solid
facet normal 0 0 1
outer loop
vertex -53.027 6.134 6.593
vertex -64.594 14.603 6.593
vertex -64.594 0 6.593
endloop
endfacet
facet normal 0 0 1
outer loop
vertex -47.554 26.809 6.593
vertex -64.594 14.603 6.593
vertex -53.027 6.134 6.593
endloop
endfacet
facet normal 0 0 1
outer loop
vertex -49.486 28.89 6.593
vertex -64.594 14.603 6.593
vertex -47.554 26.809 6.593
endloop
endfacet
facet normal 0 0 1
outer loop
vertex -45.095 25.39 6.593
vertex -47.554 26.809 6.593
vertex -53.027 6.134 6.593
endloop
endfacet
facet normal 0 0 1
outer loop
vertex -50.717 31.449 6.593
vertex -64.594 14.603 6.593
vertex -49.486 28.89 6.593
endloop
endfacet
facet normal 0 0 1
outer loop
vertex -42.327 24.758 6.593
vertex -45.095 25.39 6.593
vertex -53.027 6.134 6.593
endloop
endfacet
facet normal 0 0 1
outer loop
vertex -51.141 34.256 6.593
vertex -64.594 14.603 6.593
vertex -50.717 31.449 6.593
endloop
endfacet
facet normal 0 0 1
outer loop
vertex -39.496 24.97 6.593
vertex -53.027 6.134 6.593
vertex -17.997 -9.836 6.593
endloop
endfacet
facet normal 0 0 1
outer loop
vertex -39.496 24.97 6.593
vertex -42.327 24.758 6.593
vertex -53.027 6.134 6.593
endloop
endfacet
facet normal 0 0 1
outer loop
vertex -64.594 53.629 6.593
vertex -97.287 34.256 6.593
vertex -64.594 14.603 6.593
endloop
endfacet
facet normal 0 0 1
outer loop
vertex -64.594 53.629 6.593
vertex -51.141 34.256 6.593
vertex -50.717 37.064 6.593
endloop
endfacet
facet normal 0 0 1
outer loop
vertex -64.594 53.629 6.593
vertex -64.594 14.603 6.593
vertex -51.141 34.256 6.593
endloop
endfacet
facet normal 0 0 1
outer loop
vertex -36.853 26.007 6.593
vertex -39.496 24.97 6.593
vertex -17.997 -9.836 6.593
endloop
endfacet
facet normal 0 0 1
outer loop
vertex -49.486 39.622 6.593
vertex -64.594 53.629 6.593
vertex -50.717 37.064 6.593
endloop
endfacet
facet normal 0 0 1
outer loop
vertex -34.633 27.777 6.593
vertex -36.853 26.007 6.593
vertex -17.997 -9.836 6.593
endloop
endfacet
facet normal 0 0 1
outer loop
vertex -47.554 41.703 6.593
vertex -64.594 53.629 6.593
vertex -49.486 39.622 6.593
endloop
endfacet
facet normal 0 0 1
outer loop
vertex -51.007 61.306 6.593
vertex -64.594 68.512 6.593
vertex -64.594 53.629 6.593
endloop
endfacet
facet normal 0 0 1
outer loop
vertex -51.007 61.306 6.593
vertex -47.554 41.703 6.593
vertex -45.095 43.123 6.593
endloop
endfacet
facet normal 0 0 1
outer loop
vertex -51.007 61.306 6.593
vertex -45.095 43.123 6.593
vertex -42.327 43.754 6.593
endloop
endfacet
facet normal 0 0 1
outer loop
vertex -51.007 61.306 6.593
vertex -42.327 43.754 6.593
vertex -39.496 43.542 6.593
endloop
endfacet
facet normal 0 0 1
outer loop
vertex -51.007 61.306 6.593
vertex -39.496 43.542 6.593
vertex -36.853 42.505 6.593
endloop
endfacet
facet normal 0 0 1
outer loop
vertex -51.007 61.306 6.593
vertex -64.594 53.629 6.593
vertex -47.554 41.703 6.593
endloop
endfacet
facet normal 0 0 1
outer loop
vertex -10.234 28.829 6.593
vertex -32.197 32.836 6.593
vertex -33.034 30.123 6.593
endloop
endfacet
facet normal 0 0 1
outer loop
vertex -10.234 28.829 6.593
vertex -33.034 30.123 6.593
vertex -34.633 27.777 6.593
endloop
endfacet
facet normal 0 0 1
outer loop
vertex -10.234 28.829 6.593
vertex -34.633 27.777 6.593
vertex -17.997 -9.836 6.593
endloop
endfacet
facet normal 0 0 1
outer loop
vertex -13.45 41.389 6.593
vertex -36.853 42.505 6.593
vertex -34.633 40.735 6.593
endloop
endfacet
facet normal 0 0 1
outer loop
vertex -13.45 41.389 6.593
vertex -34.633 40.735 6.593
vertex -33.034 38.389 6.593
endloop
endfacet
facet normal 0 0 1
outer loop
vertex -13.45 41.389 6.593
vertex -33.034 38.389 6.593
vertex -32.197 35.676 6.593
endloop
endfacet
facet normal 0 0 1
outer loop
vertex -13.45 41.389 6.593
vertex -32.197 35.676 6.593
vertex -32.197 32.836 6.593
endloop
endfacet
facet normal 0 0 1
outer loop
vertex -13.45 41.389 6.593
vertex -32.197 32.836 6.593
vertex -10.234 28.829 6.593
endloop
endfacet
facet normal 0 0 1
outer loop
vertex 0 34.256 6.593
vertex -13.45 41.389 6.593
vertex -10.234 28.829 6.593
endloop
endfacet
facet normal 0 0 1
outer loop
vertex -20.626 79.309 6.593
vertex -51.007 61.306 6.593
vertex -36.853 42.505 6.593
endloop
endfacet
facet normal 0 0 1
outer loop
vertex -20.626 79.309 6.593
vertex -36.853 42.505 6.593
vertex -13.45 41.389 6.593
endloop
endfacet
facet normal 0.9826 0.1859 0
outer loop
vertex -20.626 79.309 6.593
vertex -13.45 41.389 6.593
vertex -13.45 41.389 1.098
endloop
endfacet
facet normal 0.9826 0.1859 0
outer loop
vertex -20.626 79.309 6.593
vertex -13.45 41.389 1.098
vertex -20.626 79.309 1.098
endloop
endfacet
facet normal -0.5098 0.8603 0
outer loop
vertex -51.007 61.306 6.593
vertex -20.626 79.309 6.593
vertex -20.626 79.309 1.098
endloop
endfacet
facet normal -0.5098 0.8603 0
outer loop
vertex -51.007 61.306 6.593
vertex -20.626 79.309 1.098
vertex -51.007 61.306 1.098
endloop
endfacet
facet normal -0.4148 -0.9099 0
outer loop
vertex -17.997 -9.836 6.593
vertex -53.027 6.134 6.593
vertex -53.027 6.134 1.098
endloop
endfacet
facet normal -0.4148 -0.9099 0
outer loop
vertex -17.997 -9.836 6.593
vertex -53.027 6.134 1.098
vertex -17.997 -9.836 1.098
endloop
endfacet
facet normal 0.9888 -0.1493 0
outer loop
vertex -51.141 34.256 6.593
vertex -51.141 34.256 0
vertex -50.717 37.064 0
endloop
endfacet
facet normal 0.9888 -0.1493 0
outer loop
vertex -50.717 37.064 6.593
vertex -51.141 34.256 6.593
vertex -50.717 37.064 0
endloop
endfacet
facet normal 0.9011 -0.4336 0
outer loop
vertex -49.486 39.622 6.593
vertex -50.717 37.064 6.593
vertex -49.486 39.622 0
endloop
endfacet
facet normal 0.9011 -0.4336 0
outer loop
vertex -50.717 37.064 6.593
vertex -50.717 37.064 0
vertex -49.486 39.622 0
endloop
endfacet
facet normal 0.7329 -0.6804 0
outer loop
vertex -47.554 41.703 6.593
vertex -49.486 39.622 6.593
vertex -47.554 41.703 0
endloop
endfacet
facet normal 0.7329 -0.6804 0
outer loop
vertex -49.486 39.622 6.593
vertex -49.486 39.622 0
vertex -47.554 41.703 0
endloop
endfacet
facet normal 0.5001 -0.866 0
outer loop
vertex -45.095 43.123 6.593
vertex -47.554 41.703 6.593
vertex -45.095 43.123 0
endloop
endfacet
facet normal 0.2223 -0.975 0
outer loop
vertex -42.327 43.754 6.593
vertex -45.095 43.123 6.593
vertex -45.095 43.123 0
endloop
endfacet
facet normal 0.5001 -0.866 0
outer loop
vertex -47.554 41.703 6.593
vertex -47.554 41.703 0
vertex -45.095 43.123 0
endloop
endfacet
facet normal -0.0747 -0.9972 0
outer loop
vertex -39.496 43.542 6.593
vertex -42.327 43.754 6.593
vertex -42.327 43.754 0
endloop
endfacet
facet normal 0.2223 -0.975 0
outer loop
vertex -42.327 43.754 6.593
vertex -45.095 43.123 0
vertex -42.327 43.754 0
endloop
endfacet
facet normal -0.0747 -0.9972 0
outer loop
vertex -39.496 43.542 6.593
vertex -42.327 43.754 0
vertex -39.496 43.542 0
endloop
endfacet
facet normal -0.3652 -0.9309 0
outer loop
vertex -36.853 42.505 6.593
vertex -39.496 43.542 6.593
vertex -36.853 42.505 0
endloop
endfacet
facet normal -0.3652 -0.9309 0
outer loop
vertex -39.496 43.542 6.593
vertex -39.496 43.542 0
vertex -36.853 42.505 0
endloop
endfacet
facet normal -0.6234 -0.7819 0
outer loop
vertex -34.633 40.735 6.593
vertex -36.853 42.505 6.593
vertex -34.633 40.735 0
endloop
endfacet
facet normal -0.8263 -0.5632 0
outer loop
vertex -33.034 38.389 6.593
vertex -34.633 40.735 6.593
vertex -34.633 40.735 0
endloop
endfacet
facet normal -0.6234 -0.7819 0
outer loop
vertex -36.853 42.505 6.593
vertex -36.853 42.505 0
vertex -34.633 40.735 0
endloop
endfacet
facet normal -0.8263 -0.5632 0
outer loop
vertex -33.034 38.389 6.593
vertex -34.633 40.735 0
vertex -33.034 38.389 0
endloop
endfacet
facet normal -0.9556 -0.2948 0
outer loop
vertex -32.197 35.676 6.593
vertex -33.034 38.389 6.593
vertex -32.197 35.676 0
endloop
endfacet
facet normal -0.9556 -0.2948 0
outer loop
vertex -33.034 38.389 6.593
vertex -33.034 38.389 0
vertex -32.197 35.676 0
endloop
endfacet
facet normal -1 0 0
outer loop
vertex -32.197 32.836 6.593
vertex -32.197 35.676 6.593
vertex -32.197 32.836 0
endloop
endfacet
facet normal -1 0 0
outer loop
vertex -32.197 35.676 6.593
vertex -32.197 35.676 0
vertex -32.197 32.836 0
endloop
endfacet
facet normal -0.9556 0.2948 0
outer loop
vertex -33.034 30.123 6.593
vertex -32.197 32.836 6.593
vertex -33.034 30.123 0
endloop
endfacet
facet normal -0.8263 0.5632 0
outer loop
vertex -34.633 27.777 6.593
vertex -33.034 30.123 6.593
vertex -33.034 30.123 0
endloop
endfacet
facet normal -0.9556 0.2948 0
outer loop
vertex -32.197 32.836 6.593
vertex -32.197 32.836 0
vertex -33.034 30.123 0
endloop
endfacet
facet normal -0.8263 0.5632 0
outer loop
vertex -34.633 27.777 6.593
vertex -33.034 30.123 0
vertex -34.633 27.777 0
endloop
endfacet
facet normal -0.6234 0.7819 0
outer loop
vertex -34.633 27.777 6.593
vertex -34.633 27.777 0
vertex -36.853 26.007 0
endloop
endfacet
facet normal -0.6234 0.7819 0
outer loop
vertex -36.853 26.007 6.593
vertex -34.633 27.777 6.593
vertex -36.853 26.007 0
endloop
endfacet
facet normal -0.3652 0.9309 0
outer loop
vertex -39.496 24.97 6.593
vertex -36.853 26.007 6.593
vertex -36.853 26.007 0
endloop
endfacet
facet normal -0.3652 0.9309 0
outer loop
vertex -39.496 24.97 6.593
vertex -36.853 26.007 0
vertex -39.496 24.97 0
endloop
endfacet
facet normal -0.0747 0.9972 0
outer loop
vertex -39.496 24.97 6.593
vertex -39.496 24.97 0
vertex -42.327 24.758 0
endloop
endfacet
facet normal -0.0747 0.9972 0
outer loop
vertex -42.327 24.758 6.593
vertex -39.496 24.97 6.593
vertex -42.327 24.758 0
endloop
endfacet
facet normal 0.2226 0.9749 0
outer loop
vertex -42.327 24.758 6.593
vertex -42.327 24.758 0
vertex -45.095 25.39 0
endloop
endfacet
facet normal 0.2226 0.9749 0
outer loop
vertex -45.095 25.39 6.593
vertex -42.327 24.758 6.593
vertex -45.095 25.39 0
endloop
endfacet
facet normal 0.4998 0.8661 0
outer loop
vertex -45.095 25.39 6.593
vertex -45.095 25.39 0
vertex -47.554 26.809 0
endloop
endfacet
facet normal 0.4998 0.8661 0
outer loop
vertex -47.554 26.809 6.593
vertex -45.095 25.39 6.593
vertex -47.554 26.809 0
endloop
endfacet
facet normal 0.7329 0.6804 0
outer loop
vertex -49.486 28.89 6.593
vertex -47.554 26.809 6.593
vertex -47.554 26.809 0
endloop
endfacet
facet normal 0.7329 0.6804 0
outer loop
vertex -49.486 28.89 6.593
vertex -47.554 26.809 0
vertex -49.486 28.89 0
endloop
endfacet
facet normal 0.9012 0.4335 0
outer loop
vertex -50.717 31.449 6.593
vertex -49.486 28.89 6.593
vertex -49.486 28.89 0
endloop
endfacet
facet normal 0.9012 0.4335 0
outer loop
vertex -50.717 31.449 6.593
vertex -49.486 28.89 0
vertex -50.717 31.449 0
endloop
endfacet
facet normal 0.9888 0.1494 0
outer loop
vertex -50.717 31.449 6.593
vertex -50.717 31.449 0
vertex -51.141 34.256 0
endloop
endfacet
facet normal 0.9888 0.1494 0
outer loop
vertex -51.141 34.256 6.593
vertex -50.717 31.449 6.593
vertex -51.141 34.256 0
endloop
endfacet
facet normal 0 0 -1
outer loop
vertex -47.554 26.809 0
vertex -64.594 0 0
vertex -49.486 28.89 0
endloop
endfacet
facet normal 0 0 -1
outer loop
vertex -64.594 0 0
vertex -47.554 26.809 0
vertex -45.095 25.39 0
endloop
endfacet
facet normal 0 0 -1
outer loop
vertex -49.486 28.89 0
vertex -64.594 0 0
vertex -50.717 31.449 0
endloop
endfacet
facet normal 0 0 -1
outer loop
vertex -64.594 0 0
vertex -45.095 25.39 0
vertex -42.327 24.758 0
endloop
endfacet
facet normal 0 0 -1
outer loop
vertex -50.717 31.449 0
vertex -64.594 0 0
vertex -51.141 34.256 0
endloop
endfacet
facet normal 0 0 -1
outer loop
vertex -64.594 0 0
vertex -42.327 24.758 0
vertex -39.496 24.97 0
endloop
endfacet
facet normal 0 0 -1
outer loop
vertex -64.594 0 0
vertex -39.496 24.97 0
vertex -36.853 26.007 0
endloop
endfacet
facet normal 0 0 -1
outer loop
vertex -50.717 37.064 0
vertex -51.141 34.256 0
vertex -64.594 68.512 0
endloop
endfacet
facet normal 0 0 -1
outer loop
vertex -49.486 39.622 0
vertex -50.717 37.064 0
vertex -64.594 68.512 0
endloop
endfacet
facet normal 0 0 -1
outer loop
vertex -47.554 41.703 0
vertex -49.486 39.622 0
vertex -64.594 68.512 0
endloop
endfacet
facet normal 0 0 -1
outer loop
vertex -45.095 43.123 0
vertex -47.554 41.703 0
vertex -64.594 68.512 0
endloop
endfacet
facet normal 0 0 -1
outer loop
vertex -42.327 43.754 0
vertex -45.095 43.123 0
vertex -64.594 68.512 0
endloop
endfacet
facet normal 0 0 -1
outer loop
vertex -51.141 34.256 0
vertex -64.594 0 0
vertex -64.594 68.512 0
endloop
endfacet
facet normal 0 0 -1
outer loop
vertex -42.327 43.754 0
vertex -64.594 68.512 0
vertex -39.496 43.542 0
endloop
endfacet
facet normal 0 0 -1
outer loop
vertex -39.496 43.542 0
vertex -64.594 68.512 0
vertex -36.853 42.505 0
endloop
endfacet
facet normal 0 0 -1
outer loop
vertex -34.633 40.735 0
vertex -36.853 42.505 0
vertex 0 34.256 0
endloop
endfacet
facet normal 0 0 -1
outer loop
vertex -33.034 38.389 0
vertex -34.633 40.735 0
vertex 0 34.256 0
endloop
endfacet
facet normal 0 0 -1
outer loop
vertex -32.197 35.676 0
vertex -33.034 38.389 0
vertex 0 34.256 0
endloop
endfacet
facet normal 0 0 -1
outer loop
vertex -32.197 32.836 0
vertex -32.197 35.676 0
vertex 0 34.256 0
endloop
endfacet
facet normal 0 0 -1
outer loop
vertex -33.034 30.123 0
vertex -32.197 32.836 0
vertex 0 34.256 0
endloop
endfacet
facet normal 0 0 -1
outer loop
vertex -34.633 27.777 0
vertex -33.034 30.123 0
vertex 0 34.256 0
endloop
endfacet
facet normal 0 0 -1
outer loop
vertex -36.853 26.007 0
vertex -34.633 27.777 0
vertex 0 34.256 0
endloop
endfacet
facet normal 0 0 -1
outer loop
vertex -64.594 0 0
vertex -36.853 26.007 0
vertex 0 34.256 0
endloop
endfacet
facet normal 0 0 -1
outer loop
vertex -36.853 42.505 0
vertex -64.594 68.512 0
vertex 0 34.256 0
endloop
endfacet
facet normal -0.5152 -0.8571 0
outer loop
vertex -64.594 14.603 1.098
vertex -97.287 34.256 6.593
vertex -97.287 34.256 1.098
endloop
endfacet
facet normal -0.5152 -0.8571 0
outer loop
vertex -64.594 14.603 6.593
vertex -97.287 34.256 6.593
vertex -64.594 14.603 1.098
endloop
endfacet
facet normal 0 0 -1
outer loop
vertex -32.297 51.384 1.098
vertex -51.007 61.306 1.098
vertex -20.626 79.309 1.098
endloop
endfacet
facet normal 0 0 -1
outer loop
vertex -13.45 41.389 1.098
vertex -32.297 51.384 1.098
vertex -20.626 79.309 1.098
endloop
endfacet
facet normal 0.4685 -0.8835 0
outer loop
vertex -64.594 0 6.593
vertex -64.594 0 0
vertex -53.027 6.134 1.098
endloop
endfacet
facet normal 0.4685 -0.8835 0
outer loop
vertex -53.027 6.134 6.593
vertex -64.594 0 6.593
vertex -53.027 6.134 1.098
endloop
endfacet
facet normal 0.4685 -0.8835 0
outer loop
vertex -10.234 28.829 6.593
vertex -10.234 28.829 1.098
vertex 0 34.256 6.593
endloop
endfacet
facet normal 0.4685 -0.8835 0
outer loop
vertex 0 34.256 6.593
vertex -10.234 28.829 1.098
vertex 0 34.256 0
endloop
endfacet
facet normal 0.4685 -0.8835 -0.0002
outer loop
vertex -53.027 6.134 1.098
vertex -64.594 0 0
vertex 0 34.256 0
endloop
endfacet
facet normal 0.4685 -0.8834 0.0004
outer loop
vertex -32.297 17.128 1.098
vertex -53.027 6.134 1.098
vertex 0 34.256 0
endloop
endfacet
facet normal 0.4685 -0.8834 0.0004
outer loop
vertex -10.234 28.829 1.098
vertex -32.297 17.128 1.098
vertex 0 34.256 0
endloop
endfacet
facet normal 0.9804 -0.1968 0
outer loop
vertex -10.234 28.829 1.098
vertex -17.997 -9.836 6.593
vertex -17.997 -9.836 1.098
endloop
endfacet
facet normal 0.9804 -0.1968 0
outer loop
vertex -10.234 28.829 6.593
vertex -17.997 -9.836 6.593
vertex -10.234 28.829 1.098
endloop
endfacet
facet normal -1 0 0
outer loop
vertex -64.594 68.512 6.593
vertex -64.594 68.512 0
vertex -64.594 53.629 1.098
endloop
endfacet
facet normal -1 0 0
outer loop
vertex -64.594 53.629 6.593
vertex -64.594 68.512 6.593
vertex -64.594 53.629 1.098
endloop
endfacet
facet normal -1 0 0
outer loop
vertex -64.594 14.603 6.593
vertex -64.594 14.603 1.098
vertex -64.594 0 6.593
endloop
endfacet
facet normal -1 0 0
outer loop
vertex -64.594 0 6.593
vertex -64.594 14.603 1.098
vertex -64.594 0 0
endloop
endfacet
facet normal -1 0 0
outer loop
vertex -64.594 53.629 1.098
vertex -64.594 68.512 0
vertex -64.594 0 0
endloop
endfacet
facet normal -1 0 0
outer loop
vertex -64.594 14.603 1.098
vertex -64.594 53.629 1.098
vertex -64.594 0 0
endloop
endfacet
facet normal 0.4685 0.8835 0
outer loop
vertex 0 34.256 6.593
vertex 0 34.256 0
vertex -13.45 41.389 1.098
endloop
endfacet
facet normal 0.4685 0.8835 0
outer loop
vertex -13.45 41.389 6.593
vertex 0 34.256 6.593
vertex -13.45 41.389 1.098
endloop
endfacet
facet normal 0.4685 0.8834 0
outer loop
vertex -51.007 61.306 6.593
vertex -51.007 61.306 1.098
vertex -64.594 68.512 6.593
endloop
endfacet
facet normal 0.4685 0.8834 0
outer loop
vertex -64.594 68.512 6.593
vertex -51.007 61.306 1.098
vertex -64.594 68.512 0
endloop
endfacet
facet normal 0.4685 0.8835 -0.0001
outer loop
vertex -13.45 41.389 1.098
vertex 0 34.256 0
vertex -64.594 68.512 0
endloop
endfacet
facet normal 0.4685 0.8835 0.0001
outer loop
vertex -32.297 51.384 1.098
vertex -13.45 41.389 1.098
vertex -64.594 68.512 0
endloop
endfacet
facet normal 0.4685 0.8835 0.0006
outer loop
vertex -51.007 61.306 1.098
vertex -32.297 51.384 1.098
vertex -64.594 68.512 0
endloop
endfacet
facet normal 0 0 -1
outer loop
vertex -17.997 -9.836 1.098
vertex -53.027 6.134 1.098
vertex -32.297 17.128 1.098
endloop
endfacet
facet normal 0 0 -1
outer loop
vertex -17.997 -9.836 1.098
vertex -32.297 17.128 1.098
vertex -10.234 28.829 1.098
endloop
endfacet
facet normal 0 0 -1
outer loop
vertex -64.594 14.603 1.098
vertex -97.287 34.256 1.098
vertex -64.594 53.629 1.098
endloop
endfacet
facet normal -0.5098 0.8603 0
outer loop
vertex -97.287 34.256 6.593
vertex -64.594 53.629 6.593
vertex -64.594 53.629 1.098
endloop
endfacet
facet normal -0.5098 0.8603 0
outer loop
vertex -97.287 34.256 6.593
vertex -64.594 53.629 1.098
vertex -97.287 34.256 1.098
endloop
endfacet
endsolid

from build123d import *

# Parameters (mm, degrees)
F1_DEPTH = 6.5933763981
F3_D     = 19.05
F5_DEPTH = 5.4949615151


with BuildPart() as f1:
    # F0 (on Top) → F1 (new body)
    with BuildSketch(Plane.XY):
        Polygon((-64.5944178104, 68.5121715069), (-64.5944178104, 0), (0, 34.2560857534), align=None)
    extrude(amount=F1_DEPTH)

    # F3 (through all)
    with Locations(Plane.XY.offset(6.5933763981)):
        with Locations((-41.6155830026, 34.2560857534)):
            Hole(F3_D / 2)

    # F4 (on face) → F5 (join)
    with BuildSketch(Plane.XY.offset(6.5933763981)):
        Polygon((-97.2867310047, 34.2560857534), (-64.5944178104, 14.6030057222), (-64.5944178104, 34.2560857534), (-64.5944178104, 53.6291189492), align=None)
        Polygon((-32.2972089052, 17.1280428767), (-53.0271635681, 6.1344132618), (-17.9972769314, -9.8363857863), align=None)
        Polygon((-10.2336501417, 28.8289171419), (-32.2972089052, 17.1280428767), (-17.9972769314, -9.8363857863), align=None)
        Polygon((-20.6264760453, 79.3094929525), (-51.0069840933, 61.306404966), (-32.2972089052, 51.3841286302), (-13.4495195214, 41.3887128393), align=None)
    extrude(amount=-F5_DEPTH)


solid = f1.part
